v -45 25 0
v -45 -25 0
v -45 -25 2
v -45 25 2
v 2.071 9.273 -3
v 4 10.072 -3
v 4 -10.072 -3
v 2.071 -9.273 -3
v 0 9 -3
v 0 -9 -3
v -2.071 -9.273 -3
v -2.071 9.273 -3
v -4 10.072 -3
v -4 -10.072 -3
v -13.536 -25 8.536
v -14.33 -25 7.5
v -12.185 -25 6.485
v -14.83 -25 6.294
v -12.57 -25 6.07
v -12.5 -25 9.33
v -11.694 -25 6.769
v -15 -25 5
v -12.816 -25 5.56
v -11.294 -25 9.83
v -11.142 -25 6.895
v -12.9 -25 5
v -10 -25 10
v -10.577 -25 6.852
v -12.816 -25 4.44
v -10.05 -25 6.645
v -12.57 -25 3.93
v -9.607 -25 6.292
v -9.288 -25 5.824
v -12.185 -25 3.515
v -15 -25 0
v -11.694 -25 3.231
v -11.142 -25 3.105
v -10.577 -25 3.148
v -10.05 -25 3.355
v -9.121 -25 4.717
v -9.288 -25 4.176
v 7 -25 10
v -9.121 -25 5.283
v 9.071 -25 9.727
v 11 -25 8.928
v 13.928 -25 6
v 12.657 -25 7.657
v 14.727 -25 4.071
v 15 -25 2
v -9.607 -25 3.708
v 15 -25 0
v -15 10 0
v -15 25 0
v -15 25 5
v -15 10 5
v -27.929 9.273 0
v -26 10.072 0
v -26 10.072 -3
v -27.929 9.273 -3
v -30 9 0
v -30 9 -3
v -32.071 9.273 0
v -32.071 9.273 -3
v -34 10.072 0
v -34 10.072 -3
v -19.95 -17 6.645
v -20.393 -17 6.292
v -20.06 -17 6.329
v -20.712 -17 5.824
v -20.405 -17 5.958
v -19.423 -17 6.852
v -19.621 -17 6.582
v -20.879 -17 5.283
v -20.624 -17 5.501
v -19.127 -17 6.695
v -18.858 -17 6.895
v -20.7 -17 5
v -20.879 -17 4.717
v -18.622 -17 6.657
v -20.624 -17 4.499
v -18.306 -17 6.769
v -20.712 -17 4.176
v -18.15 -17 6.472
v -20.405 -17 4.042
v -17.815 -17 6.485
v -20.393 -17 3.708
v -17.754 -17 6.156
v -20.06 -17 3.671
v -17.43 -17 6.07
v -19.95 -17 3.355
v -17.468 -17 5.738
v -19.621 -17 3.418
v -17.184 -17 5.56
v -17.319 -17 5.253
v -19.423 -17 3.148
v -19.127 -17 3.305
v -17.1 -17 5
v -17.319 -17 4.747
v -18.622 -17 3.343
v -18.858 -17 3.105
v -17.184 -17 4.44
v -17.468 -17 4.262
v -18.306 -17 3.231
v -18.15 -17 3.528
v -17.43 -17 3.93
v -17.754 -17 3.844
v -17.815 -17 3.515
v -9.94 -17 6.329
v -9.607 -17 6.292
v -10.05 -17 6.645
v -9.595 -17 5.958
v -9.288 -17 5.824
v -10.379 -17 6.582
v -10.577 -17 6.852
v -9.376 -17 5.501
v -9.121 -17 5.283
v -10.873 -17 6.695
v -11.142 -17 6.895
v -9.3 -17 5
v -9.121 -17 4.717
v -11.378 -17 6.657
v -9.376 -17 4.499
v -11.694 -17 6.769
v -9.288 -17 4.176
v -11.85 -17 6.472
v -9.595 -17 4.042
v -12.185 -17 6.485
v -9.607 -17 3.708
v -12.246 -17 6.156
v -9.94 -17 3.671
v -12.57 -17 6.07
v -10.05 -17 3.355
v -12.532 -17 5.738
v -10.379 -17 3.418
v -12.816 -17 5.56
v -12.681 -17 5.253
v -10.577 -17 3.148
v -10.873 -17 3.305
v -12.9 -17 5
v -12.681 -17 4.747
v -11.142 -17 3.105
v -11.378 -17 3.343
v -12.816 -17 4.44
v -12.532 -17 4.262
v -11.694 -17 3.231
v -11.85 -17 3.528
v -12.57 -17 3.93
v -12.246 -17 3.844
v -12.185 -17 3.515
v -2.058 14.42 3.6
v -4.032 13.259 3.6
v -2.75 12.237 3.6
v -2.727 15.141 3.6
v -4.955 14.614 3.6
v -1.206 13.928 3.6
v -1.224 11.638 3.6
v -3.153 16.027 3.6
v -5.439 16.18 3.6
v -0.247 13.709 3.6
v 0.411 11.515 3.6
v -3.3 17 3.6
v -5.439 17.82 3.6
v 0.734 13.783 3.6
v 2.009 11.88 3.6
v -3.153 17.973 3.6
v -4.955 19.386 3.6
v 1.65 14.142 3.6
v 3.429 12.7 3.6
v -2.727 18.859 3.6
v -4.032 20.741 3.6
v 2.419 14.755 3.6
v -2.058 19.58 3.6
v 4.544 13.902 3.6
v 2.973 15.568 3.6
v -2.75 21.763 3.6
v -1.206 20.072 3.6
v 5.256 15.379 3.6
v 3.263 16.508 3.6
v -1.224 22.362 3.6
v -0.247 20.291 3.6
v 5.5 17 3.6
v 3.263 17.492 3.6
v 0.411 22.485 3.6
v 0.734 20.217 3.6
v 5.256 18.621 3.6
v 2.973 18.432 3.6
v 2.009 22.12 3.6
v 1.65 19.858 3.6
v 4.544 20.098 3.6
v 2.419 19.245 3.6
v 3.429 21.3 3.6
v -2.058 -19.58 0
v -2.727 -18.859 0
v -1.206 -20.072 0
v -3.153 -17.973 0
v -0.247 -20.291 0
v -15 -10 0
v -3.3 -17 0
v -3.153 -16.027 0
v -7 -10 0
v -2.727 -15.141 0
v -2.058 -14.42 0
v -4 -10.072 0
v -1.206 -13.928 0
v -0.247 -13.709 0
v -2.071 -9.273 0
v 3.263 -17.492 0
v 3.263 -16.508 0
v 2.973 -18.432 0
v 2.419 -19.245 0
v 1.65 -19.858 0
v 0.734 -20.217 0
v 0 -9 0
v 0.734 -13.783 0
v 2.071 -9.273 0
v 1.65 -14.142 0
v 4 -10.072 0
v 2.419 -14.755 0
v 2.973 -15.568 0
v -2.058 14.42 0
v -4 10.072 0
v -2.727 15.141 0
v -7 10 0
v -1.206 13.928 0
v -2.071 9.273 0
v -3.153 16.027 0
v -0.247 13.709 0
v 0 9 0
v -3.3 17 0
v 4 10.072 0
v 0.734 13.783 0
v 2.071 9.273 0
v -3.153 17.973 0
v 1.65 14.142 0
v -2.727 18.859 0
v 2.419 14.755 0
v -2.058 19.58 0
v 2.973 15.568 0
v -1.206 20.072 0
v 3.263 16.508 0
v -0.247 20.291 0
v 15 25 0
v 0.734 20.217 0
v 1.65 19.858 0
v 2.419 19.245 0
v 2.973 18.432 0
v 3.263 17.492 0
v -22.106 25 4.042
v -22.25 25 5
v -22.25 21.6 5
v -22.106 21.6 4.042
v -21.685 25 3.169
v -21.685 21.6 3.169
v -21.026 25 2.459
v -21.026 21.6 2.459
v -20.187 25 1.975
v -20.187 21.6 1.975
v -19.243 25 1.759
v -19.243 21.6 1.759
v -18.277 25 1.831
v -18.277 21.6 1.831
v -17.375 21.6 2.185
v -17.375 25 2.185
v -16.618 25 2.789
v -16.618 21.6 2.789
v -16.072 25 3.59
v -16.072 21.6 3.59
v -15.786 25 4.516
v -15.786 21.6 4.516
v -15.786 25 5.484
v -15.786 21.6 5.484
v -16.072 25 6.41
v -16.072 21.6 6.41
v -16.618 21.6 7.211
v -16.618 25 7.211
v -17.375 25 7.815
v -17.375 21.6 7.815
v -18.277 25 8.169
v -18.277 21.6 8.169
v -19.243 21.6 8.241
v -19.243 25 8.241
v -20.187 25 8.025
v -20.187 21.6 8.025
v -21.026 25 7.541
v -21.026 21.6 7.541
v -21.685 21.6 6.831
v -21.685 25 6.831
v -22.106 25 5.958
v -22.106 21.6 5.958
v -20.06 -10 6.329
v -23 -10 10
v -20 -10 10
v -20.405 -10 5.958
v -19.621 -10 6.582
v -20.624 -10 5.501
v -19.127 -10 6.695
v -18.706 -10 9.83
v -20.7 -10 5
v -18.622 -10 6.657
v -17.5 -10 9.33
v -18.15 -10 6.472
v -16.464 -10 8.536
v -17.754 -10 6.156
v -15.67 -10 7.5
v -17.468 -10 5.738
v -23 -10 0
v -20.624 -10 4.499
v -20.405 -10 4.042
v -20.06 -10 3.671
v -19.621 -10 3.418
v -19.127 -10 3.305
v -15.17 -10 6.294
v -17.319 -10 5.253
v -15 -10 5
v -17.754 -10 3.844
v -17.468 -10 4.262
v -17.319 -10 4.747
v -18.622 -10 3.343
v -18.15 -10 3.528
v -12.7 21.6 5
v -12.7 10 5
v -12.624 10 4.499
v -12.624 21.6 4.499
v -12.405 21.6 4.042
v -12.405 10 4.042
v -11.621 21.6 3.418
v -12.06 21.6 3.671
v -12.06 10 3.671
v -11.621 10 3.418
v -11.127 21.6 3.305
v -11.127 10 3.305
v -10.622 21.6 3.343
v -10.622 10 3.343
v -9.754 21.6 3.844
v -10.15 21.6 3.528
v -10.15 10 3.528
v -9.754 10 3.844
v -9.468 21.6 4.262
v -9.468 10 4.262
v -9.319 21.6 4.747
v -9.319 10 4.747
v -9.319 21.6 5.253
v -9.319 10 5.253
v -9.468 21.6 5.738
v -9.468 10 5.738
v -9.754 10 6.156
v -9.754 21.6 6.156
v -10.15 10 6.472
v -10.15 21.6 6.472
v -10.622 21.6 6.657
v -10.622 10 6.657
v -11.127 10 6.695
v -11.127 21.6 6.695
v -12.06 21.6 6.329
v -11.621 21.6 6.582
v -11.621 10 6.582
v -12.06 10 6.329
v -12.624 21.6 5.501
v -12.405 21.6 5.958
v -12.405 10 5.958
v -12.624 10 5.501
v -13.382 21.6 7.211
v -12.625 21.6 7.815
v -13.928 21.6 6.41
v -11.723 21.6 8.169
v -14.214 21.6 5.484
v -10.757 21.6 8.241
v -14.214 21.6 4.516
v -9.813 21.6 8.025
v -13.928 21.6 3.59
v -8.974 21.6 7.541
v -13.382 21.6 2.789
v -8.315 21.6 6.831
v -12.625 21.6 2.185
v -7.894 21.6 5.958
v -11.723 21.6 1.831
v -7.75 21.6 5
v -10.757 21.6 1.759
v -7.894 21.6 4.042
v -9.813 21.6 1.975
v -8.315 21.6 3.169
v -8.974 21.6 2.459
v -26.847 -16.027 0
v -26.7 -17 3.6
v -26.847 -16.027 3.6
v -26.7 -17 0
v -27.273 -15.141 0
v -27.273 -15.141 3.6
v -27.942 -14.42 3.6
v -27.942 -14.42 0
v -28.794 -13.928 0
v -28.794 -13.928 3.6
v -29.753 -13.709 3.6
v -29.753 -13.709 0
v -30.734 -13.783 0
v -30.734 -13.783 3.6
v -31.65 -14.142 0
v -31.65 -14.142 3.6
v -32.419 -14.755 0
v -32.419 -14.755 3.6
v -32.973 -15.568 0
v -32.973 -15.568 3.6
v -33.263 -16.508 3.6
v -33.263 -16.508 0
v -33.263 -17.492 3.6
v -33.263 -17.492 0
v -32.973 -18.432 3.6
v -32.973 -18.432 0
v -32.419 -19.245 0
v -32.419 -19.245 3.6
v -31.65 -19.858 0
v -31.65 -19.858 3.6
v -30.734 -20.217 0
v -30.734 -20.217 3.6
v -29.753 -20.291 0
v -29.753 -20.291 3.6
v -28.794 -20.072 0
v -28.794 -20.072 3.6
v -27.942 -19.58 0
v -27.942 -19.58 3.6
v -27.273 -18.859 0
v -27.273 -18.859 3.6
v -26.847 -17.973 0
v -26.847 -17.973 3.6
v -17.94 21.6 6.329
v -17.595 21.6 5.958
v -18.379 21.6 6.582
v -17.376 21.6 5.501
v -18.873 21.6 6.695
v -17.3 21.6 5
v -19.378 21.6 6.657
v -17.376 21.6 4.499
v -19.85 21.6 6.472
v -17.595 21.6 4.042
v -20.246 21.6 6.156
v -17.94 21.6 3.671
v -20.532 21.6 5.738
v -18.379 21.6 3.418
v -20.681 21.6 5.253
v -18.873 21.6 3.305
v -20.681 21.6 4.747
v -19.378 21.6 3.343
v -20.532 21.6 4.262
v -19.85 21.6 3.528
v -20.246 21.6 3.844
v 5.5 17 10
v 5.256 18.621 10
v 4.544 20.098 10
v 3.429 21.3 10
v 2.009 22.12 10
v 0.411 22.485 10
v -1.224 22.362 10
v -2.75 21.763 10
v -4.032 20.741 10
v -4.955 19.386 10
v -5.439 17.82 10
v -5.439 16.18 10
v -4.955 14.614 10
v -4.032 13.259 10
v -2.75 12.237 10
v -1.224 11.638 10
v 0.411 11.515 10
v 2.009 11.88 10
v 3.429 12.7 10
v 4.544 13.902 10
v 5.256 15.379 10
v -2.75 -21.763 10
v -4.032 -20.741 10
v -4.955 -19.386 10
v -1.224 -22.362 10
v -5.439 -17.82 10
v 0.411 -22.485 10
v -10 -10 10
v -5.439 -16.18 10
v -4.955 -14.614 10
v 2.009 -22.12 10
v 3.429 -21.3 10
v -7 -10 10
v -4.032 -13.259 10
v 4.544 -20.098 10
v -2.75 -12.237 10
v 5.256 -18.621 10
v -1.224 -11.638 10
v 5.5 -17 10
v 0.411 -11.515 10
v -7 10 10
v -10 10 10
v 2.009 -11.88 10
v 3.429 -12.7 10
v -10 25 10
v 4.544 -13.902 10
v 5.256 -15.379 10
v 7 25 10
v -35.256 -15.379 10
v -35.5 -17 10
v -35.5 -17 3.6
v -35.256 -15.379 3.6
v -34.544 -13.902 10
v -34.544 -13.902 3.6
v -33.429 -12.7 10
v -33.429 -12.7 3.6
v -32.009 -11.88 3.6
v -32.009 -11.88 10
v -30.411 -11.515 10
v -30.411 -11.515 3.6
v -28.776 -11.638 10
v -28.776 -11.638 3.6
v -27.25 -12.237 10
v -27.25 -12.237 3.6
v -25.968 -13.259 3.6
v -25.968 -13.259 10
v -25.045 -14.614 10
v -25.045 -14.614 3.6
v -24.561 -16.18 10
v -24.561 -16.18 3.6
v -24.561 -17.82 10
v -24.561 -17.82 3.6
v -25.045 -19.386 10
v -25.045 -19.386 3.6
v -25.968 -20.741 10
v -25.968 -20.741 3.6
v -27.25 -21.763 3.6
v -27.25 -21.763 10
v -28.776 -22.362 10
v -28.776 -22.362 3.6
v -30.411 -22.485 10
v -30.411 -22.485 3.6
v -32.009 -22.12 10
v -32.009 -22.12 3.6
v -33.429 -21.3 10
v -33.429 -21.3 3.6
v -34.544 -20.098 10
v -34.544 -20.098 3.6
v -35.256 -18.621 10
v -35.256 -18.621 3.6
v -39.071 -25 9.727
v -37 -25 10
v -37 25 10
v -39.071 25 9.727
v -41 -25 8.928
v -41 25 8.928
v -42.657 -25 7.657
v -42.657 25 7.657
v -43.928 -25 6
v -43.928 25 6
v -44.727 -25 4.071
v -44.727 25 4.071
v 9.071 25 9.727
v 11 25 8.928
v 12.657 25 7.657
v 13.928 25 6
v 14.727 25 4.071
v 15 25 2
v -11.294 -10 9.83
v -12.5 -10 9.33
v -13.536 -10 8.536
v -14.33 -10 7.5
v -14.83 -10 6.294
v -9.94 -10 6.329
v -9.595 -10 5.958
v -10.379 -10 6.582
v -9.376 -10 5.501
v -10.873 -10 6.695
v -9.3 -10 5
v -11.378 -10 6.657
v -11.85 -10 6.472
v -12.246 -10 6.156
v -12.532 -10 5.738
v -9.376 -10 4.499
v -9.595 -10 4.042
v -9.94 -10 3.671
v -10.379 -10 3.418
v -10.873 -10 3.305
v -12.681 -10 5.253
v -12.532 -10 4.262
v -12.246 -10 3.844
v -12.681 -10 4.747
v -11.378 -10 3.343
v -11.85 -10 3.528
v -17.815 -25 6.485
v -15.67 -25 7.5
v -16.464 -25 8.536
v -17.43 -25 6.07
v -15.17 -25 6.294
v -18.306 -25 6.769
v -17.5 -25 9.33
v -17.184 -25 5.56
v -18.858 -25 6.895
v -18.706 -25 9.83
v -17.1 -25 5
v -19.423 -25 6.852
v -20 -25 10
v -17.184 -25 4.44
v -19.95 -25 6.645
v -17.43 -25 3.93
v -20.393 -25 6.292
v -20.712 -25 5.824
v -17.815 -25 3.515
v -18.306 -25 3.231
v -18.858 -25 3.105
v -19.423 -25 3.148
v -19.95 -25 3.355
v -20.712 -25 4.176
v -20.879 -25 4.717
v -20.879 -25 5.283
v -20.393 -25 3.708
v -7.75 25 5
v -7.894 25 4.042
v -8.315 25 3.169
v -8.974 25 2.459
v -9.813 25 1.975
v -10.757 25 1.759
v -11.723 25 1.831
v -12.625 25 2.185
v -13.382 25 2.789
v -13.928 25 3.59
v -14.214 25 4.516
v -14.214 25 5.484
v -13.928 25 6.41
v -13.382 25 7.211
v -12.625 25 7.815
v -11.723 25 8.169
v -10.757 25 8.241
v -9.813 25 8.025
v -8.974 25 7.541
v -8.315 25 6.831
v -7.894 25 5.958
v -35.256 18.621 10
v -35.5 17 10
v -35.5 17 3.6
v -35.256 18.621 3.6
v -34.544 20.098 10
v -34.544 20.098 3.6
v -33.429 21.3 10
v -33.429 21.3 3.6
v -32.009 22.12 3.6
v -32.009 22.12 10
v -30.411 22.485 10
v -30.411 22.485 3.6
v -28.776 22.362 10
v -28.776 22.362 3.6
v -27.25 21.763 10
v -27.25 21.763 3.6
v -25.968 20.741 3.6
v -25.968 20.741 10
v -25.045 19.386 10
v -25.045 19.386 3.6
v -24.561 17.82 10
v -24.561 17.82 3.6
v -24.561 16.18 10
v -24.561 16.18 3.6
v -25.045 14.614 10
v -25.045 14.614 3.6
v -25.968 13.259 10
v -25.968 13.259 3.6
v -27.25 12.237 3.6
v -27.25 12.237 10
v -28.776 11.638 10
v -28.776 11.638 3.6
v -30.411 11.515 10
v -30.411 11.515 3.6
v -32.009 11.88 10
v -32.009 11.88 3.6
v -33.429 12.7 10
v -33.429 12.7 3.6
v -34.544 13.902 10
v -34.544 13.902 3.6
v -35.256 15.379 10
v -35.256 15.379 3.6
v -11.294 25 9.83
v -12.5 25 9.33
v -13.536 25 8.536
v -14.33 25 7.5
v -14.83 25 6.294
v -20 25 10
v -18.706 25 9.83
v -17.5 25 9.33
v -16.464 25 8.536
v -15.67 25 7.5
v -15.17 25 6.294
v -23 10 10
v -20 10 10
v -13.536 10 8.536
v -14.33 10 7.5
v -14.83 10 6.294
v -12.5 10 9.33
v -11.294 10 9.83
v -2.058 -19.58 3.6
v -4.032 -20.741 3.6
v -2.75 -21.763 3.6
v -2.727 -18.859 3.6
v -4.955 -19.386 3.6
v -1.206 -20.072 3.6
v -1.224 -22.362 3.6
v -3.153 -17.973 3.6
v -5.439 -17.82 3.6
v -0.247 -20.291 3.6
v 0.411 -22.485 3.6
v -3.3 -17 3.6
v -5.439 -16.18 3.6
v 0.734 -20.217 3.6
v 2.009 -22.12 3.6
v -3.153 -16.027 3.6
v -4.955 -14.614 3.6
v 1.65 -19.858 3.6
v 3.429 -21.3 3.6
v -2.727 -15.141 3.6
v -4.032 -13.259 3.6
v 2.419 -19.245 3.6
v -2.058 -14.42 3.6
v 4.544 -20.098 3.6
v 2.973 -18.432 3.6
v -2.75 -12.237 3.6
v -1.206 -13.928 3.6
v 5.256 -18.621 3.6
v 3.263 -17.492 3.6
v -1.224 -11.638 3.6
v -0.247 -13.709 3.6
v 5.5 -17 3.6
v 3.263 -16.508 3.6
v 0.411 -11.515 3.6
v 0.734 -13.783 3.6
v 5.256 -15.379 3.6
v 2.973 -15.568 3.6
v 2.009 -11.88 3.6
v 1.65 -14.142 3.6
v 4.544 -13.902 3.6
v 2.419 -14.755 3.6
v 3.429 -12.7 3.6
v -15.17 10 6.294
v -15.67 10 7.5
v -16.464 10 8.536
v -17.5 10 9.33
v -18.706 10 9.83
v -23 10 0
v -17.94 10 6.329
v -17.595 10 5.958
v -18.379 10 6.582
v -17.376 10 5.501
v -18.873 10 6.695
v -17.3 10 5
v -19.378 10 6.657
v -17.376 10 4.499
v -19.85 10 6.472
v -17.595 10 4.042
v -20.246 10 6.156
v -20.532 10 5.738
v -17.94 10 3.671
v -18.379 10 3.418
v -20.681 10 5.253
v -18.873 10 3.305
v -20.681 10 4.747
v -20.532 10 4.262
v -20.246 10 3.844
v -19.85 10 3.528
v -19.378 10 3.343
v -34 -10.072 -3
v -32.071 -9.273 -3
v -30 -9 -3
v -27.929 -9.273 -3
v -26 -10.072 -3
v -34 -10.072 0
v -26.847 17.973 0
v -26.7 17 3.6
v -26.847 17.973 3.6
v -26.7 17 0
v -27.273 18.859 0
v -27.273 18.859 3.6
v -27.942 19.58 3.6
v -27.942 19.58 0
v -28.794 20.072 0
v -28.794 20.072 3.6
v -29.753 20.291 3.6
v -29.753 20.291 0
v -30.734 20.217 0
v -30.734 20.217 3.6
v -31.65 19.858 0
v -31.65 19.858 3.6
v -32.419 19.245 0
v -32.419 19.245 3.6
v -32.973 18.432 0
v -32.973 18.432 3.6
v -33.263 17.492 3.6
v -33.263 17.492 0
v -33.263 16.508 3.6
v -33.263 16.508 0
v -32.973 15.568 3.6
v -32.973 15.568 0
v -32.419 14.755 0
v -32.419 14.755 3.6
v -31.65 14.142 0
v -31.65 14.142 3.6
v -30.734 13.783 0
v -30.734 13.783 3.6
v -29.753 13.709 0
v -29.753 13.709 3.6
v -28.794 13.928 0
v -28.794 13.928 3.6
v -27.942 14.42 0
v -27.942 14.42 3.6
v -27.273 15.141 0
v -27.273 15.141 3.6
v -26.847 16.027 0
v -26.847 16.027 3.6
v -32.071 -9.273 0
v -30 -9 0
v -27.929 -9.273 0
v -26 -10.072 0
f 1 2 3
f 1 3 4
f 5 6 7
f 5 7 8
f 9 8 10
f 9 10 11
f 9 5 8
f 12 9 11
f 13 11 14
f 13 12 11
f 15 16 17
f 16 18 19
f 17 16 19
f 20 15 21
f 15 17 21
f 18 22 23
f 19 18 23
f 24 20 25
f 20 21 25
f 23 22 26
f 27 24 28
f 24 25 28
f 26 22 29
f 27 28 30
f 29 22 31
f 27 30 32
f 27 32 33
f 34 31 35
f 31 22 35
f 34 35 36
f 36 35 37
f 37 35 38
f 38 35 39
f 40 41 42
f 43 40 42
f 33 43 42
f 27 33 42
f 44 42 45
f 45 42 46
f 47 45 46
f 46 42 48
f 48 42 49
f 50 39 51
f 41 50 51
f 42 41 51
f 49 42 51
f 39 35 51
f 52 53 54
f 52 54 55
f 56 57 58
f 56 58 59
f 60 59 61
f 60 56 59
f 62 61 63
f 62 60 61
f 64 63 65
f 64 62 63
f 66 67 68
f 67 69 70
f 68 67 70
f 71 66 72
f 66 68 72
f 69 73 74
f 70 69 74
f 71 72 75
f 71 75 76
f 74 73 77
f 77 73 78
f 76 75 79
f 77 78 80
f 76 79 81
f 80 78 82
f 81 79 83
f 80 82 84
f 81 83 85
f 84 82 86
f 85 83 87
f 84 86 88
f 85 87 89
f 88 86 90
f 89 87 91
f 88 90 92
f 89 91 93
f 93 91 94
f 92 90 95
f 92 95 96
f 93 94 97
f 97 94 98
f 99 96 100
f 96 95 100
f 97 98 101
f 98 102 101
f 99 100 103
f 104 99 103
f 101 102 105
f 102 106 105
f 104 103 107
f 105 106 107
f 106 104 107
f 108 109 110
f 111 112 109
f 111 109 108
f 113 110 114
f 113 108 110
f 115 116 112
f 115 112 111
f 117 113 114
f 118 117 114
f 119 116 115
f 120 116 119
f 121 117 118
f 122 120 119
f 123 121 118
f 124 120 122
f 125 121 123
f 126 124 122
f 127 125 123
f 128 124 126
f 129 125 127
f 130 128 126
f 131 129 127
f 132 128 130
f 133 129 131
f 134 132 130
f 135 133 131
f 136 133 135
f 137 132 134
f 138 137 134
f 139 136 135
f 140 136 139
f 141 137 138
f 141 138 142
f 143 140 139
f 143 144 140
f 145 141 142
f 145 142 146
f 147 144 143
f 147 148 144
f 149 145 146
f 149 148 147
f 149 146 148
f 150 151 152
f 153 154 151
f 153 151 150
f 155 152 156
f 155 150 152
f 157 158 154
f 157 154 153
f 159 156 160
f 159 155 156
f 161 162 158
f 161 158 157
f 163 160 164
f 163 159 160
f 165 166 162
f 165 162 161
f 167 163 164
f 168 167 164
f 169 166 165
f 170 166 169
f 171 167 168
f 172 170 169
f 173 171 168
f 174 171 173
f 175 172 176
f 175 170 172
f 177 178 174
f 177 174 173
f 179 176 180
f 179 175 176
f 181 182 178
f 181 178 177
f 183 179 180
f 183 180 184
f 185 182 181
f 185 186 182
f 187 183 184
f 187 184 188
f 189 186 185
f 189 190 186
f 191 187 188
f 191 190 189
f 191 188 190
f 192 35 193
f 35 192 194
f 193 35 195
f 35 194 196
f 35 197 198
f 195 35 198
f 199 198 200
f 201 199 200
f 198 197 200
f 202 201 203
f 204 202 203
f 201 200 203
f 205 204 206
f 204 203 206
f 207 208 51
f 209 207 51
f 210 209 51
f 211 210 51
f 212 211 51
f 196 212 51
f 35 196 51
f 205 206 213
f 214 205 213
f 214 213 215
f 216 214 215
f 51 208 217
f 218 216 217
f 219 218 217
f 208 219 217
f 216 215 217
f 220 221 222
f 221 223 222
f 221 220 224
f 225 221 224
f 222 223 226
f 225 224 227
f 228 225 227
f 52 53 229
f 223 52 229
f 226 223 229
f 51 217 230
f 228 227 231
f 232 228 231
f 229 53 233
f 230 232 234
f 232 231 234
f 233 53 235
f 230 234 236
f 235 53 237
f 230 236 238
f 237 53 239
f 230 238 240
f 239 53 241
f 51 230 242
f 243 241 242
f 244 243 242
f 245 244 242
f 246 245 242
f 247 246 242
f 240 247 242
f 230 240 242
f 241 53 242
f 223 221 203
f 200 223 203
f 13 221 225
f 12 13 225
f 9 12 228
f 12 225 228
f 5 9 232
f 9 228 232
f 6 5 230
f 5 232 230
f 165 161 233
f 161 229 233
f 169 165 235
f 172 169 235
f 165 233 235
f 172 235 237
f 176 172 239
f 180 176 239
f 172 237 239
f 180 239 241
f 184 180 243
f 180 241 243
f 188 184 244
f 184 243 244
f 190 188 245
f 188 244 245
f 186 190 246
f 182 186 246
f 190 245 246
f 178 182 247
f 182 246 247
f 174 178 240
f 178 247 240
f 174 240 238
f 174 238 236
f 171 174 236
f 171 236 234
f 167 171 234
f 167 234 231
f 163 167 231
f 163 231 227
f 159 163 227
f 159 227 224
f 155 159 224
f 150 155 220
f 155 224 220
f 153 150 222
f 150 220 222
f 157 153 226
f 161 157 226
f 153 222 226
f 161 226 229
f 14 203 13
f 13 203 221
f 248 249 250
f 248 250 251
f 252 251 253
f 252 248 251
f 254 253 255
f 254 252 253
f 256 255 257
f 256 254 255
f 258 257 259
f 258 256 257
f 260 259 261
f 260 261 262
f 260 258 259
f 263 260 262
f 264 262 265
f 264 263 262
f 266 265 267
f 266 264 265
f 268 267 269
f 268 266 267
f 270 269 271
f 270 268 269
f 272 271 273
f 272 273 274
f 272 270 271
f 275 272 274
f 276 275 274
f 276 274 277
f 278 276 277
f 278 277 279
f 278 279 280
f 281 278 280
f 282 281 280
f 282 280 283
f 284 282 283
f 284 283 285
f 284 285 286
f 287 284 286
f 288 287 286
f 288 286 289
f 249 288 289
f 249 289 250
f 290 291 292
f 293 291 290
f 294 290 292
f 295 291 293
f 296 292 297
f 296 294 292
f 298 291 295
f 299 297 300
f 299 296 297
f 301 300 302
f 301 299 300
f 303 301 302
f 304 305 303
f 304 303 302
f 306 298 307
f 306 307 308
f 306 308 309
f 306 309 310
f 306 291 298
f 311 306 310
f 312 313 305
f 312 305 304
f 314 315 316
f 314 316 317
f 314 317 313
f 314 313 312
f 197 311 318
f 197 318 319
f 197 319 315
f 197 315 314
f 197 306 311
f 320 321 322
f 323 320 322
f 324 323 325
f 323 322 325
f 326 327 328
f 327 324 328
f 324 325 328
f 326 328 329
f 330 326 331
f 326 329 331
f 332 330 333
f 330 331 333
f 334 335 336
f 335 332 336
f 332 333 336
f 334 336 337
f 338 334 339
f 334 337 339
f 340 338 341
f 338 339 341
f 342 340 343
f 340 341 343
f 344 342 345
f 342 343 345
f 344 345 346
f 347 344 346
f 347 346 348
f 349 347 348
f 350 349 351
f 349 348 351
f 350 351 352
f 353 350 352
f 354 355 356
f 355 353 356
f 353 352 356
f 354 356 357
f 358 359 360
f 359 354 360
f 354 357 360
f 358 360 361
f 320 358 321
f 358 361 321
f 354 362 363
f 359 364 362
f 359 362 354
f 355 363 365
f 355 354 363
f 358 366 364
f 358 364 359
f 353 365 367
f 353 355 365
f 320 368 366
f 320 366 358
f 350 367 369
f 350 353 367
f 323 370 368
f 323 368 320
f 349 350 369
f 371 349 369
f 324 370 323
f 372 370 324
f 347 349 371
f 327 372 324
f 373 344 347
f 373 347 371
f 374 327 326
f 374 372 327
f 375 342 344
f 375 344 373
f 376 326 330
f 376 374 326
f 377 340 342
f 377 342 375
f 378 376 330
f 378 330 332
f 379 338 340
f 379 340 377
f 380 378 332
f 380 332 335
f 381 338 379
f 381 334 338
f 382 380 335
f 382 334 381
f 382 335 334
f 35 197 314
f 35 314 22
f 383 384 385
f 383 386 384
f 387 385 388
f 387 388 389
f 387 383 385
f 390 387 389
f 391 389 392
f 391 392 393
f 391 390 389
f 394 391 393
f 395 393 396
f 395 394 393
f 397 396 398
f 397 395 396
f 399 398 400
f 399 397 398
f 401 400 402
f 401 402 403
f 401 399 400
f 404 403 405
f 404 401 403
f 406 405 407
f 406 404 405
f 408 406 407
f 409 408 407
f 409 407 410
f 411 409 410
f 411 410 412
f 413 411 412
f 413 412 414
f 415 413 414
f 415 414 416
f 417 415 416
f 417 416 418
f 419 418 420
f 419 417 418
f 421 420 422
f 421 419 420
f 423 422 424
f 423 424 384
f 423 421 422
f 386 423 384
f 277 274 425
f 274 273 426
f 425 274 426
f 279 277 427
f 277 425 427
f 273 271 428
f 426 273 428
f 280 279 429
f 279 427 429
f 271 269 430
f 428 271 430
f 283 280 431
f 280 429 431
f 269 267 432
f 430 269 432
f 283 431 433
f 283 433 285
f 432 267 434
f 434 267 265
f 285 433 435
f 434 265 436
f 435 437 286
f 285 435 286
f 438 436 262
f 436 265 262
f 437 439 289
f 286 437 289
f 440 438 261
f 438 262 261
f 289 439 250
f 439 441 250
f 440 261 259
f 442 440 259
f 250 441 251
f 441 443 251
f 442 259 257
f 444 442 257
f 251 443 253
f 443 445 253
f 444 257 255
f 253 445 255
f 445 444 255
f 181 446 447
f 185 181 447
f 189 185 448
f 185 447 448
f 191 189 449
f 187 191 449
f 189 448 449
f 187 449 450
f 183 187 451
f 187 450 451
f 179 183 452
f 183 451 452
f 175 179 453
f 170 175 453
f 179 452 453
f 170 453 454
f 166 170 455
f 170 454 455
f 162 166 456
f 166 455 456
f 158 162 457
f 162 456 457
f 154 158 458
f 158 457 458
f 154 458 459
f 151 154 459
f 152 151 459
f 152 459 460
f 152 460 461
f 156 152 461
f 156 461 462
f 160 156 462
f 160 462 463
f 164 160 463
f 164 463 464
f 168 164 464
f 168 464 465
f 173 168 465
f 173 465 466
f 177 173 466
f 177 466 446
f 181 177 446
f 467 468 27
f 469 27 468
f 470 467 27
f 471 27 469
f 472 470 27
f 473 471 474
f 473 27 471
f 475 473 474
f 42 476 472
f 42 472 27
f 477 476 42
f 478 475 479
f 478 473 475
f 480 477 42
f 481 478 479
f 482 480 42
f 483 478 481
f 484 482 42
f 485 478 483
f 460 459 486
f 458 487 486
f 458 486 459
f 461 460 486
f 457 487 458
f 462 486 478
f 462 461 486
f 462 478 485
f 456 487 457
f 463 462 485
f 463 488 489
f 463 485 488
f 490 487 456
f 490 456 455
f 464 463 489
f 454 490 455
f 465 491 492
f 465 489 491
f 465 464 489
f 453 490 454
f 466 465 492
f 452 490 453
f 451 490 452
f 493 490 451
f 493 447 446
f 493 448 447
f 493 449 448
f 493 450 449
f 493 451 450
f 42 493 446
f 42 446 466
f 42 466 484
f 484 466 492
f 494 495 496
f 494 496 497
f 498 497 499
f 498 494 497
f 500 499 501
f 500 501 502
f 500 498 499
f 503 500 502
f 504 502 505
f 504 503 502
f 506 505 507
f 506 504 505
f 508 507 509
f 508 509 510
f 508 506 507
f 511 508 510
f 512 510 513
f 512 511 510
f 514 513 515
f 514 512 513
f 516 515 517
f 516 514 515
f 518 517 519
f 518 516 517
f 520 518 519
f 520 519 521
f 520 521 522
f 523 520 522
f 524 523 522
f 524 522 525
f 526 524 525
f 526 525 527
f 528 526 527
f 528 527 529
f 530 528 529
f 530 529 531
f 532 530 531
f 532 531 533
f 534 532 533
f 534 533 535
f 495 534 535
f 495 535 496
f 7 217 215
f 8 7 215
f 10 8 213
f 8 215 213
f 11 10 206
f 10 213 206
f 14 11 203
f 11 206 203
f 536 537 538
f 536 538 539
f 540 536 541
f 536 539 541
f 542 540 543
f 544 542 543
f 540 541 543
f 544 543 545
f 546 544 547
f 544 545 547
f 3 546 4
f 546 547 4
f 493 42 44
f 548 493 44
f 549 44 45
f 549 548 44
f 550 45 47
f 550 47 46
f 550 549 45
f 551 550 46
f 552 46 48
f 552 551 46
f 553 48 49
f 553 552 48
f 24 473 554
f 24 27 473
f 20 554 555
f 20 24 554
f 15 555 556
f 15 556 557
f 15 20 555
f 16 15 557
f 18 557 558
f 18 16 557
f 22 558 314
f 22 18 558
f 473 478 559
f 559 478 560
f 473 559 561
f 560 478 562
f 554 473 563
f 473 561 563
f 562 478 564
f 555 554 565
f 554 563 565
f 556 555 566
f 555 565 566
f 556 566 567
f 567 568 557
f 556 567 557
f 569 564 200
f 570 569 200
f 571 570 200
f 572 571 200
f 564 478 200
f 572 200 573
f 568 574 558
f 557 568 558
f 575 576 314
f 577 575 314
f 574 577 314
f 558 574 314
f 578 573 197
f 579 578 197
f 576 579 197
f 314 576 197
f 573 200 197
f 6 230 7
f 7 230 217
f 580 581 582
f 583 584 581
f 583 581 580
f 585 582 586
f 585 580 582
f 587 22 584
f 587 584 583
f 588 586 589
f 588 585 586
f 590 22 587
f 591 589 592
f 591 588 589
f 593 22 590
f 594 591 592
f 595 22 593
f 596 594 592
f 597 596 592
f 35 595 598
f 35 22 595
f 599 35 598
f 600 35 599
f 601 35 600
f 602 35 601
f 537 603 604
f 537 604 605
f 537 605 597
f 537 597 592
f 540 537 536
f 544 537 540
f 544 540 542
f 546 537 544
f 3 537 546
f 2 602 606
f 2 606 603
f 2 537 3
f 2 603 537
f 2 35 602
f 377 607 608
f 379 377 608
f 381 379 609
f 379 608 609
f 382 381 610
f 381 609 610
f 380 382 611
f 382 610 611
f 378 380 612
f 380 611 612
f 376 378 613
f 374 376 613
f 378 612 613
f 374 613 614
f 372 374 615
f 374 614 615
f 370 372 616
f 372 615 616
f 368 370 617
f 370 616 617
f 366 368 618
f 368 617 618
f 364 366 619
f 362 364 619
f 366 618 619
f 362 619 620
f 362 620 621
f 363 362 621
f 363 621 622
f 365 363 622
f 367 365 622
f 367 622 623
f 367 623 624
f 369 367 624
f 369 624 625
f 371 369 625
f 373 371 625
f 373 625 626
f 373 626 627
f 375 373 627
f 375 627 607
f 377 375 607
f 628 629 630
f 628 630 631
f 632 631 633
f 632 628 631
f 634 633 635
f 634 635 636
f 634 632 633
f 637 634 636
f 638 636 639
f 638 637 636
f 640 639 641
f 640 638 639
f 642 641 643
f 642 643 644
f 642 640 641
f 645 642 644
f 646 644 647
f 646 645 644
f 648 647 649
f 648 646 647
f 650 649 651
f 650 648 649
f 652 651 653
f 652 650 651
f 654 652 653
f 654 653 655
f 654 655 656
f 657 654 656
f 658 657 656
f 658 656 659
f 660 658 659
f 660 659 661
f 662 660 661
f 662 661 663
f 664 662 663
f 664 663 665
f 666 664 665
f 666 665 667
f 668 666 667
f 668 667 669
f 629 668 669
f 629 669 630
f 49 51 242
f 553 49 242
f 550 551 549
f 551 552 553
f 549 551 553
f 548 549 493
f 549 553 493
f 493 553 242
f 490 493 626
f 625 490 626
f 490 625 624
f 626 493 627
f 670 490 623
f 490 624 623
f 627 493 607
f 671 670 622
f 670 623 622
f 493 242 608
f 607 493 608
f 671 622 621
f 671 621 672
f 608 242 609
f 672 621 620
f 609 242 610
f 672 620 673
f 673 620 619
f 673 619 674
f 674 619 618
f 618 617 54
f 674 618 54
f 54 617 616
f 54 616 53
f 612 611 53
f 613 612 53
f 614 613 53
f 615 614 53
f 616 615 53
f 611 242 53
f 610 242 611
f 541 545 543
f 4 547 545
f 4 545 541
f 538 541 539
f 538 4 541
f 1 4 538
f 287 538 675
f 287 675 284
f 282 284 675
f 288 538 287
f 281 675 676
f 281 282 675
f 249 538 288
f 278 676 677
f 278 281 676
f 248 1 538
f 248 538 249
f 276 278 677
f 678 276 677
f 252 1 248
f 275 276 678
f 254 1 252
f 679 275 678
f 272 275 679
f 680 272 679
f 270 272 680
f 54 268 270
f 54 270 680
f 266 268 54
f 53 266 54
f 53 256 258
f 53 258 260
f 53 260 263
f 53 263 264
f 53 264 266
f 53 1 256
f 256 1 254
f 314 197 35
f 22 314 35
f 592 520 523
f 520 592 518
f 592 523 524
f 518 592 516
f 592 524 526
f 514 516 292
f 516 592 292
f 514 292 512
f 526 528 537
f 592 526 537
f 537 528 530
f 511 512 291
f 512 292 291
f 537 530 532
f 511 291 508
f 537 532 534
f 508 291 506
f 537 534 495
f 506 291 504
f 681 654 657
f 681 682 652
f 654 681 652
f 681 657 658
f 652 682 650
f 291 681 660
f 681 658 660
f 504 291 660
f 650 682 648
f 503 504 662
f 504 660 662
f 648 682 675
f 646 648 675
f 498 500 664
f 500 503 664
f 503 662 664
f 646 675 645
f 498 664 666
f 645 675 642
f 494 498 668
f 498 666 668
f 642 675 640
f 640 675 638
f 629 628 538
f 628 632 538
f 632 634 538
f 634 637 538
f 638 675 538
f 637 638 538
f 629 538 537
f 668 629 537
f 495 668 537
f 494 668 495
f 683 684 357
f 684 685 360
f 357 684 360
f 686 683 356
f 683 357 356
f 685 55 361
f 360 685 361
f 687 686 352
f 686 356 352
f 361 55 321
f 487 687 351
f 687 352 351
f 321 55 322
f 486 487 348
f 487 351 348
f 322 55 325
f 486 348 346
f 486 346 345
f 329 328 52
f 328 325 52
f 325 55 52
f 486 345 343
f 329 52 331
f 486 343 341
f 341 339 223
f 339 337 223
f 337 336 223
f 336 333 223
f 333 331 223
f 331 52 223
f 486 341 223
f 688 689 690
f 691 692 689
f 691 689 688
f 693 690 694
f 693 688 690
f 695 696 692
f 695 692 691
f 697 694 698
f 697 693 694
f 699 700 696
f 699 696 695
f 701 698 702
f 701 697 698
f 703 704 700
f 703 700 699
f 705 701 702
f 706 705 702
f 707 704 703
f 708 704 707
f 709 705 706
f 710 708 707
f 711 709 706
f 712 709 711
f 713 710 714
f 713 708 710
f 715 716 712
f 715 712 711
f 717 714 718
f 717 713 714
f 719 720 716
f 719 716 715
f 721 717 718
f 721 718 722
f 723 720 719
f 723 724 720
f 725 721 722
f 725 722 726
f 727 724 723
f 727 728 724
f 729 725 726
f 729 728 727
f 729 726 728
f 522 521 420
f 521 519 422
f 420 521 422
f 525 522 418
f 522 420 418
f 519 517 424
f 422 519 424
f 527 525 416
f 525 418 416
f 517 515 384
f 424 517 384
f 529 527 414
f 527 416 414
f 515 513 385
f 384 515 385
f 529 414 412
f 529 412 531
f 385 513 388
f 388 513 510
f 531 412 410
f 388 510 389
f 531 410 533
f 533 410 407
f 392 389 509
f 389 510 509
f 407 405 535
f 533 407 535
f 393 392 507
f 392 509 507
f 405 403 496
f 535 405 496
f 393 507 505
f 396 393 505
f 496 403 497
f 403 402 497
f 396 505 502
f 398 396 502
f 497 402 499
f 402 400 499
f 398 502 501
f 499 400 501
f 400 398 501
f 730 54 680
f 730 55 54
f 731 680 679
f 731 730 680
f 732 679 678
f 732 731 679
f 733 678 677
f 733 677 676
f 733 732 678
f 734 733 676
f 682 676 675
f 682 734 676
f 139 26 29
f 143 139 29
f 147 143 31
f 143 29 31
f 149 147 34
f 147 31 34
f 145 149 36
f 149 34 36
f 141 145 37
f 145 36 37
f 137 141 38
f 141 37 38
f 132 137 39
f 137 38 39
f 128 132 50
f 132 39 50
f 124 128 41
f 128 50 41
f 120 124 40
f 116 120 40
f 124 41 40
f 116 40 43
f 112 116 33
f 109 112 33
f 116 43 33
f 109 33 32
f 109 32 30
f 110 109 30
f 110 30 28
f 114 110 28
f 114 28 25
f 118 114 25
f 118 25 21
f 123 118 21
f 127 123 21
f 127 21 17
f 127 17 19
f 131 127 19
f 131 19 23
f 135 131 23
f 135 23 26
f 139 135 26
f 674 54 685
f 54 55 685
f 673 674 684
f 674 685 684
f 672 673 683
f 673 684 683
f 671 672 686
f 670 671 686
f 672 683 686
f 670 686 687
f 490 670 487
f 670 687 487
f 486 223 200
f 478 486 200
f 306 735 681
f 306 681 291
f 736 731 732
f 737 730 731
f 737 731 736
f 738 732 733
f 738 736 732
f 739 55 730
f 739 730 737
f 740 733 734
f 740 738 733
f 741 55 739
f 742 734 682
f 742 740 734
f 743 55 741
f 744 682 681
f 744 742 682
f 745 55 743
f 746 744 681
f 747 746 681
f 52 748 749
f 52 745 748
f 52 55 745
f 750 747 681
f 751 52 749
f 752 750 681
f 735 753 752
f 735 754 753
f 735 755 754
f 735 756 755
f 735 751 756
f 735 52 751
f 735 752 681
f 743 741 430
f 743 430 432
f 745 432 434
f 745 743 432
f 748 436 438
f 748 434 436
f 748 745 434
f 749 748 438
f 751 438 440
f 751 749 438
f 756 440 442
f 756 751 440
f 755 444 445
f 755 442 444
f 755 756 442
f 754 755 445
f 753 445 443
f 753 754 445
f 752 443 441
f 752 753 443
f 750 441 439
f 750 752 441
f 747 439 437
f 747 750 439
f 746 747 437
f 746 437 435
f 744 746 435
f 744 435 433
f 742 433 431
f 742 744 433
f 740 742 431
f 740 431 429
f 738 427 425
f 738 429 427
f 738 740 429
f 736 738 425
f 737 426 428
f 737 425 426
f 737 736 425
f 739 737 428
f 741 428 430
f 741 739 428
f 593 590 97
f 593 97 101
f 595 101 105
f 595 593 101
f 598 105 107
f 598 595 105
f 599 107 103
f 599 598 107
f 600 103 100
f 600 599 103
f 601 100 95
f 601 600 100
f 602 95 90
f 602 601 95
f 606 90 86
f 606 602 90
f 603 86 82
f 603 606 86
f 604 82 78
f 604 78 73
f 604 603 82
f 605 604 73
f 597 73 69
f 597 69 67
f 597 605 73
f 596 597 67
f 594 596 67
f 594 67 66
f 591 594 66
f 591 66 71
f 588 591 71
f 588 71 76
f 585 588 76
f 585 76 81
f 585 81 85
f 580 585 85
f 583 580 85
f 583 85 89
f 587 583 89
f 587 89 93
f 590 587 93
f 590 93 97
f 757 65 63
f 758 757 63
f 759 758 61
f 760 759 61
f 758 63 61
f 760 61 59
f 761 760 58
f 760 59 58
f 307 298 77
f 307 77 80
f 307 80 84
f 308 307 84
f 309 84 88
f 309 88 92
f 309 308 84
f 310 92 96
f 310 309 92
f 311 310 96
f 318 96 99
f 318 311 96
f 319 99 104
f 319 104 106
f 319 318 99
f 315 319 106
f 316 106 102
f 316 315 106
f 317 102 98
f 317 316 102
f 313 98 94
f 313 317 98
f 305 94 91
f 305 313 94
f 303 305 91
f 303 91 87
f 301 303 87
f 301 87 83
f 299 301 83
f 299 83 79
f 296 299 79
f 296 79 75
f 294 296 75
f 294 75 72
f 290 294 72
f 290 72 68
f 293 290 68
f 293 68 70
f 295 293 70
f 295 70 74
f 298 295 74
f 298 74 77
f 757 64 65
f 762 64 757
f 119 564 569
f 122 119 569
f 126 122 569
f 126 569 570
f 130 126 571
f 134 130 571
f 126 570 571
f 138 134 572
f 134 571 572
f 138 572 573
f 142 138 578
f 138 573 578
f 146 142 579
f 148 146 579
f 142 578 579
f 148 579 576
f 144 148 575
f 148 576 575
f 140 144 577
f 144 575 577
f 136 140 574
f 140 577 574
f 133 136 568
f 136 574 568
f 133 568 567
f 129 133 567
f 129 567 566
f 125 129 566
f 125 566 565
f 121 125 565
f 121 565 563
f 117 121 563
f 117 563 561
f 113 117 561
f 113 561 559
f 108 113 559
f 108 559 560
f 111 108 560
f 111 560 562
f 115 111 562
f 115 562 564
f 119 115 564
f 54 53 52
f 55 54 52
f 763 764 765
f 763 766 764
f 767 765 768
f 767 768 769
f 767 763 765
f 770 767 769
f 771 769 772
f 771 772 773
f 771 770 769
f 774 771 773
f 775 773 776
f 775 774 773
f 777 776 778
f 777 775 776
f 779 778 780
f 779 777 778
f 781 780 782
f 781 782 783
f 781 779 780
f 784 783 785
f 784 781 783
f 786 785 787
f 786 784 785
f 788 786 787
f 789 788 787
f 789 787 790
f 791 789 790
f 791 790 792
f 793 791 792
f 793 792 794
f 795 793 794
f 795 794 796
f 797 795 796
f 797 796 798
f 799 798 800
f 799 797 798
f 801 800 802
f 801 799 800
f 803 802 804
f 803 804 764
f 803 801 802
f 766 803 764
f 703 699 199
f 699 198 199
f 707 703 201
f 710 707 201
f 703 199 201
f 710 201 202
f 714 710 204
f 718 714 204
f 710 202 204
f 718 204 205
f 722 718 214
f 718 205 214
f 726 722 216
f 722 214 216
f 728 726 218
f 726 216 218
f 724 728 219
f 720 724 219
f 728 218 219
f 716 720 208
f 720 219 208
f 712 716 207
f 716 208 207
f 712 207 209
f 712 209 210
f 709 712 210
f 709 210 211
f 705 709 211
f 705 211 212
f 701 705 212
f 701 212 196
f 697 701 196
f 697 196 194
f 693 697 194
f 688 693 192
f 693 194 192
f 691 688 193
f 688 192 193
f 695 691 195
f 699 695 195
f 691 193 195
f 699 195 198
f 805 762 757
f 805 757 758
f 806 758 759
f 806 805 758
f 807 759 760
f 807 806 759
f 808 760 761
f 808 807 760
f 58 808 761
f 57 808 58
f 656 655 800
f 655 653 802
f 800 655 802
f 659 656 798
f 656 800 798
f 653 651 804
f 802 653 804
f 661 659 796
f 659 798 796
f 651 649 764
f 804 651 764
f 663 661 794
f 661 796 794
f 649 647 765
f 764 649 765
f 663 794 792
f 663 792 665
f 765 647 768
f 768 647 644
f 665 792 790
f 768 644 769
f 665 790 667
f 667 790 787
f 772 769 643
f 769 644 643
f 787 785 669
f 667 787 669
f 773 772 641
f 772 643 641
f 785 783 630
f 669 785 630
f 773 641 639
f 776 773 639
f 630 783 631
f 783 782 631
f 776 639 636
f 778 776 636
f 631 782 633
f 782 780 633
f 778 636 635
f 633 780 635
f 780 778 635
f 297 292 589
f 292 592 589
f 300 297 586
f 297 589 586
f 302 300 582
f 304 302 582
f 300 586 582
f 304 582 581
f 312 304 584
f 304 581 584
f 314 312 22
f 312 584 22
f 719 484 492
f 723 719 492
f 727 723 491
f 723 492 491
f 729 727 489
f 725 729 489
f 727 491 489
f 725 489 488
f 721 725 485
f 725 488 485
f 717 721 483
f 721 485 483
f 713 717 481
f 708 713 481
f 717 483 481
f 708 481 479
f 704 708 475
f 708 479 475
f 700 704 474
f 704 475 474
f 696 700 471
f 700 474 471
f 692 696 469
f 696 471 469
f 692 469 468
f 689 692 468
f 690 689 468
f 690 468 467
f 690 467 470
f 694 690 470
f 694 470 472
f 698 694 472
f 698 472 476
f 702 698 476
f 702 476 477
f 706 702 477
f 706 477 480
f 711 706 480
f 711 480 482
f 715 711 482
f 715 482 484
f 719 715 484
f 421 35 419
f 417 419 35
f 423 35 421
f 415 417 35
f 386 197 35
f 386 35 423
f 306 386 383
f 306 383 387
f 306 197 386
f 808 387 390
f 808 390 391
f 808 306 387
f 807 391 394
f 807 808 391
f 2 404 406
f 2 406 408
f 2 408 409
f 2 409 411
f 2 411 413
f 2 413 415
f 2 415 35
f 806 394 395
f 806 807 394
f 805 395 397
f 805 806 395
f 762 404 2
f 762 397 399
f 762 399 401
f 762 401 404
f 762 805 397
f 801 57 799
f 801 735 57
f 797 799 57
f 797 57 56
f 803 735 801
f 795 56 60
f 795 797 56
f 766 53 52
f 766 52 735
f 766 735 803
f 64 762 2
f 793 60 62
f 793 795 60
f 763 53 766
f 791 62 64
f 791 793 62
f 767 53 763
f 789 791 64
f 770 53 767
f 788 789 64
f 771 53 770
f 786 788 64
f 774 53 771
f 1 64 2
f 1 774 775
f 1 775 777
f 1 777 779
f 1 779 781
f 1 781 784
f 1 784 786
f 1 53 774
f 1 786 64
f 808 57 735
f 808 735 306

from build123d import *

# Parameters (mm, degrees)
BASE_DEPTH               = 10
MOUNT_HOLES_D            = 6.6
MOUNT_HOLES_CBORE_D      = 11
MOUNT_HOLES_CBORE_DEPTH  = 6.4
TOP_HINGE_D              = 3.4
TOP_HINGE_DEPTH          = 15
TOP_HINGE_CBORE_D        = 6.5
TOP_HINGE_CBORE_DEPTH    = 3.4
BOTTOM_HINGE_D           = 3.4
BOTTOM_HINGE_CBORE_D     = 3.8
BOTTOM_HINGE_CBORE_DEPTH = 8
PROFILE_CLICK_DEPTH      = 3
HINGE_ROUND_R            = 5
ZAOBLIT2_R               = 8


with BuildPart() as part:
    # Base sketch → Base (new body)
    with BuildSketch(Plane.XY):
        Polygon((-15, 25), (-15, 10), (-7, 10), (-7, -10), (-15, -10), (-15, -25), (15, -25), (15, 25), align=None)
    extrude(amount=BASE_DEPTH)

    # Mount holes (through all)
    with Locations(Plane.XY.offset(10)):
        with Locations((0, 17), (0, -17)):
            CounterBoreHole(MOUNT_HOLES_D / 2, MOUNT_HOLES_CBORE_D / 2, MOUNT_HOLES_CBORE_DEPTH)

    # Top hinge
    with Locations(Plane(origin=(0, 25, 0), x_dir=(1, 0, 0), z_dir=(0, 1, 0))):
        with Locations((-11, -5)):
            CounterBoreHole(TOP_HINGE_D / 2, TOP_HINGE_CBORE_D / 2, TOP_HINGE_CBORE_DEPTH, depth=TOP_HINGE_DEPTH)

    # Bottom hinge (through all)
    with Locations(Plane(origin=(0, -25, 0), x_dir=(-1, 0, 0), z_dir=(0, -1, 0))):
        with Locations((11, -5)):
            CounterBoreHole(BOTTOM_HINGE_D / 2, BOTTOM_HINGE_CBORE_D / 2, BOTTOM_HINGE_CBORE_DEPTH)

    # profile sketch → Profile click (add)
    with BuildSketch(Plane(origin=(0, 0, 0), x_dir=(-1, 0, 0), z_dir=(0, 0, -1))):
        with BuildLine():
            ThreePointArc((4, 10.07179677), (0, 9), (-4, 10.07179677))
            Line((-4, 10.07179677), (-4, -10.07179677))
            ThreePointArc((-4, -10.07179677), (0, -9), (4, -10.07179677))
            Line((4, -10.07179677), (4, 10.07179677))
        make_face()
    extrude(amount=PROFILE_CLICK_DEPTH)

    # Hinge round
    hinge_round_edges = [part.edges().sort_by_distance(p)[0] for p in [
        (-15, -17.5, 10),
        (-15, 17.5, 10),
    ]]
    fillet(hinge_round_edges, radius=HINGE_ROUND_R)

    # Zaoblit2
    zaoblit2_edges = [part.edges().sort_by_distance(p)[0] for p in [
        (15, 0, 10),
    ]]
    fillet(zaoblit2_edges, radius=ZAOBLIT2_R)


with BuildPart() as body_2:
    # Mirror R: mirrored copy
    add(part.part.mirror(Plane(origin=(-15, 0, 10), x_dir=(0, 0, 1), z_dir=(1, 0, 0))))


solid = Compound([part.part, body_2.part])
